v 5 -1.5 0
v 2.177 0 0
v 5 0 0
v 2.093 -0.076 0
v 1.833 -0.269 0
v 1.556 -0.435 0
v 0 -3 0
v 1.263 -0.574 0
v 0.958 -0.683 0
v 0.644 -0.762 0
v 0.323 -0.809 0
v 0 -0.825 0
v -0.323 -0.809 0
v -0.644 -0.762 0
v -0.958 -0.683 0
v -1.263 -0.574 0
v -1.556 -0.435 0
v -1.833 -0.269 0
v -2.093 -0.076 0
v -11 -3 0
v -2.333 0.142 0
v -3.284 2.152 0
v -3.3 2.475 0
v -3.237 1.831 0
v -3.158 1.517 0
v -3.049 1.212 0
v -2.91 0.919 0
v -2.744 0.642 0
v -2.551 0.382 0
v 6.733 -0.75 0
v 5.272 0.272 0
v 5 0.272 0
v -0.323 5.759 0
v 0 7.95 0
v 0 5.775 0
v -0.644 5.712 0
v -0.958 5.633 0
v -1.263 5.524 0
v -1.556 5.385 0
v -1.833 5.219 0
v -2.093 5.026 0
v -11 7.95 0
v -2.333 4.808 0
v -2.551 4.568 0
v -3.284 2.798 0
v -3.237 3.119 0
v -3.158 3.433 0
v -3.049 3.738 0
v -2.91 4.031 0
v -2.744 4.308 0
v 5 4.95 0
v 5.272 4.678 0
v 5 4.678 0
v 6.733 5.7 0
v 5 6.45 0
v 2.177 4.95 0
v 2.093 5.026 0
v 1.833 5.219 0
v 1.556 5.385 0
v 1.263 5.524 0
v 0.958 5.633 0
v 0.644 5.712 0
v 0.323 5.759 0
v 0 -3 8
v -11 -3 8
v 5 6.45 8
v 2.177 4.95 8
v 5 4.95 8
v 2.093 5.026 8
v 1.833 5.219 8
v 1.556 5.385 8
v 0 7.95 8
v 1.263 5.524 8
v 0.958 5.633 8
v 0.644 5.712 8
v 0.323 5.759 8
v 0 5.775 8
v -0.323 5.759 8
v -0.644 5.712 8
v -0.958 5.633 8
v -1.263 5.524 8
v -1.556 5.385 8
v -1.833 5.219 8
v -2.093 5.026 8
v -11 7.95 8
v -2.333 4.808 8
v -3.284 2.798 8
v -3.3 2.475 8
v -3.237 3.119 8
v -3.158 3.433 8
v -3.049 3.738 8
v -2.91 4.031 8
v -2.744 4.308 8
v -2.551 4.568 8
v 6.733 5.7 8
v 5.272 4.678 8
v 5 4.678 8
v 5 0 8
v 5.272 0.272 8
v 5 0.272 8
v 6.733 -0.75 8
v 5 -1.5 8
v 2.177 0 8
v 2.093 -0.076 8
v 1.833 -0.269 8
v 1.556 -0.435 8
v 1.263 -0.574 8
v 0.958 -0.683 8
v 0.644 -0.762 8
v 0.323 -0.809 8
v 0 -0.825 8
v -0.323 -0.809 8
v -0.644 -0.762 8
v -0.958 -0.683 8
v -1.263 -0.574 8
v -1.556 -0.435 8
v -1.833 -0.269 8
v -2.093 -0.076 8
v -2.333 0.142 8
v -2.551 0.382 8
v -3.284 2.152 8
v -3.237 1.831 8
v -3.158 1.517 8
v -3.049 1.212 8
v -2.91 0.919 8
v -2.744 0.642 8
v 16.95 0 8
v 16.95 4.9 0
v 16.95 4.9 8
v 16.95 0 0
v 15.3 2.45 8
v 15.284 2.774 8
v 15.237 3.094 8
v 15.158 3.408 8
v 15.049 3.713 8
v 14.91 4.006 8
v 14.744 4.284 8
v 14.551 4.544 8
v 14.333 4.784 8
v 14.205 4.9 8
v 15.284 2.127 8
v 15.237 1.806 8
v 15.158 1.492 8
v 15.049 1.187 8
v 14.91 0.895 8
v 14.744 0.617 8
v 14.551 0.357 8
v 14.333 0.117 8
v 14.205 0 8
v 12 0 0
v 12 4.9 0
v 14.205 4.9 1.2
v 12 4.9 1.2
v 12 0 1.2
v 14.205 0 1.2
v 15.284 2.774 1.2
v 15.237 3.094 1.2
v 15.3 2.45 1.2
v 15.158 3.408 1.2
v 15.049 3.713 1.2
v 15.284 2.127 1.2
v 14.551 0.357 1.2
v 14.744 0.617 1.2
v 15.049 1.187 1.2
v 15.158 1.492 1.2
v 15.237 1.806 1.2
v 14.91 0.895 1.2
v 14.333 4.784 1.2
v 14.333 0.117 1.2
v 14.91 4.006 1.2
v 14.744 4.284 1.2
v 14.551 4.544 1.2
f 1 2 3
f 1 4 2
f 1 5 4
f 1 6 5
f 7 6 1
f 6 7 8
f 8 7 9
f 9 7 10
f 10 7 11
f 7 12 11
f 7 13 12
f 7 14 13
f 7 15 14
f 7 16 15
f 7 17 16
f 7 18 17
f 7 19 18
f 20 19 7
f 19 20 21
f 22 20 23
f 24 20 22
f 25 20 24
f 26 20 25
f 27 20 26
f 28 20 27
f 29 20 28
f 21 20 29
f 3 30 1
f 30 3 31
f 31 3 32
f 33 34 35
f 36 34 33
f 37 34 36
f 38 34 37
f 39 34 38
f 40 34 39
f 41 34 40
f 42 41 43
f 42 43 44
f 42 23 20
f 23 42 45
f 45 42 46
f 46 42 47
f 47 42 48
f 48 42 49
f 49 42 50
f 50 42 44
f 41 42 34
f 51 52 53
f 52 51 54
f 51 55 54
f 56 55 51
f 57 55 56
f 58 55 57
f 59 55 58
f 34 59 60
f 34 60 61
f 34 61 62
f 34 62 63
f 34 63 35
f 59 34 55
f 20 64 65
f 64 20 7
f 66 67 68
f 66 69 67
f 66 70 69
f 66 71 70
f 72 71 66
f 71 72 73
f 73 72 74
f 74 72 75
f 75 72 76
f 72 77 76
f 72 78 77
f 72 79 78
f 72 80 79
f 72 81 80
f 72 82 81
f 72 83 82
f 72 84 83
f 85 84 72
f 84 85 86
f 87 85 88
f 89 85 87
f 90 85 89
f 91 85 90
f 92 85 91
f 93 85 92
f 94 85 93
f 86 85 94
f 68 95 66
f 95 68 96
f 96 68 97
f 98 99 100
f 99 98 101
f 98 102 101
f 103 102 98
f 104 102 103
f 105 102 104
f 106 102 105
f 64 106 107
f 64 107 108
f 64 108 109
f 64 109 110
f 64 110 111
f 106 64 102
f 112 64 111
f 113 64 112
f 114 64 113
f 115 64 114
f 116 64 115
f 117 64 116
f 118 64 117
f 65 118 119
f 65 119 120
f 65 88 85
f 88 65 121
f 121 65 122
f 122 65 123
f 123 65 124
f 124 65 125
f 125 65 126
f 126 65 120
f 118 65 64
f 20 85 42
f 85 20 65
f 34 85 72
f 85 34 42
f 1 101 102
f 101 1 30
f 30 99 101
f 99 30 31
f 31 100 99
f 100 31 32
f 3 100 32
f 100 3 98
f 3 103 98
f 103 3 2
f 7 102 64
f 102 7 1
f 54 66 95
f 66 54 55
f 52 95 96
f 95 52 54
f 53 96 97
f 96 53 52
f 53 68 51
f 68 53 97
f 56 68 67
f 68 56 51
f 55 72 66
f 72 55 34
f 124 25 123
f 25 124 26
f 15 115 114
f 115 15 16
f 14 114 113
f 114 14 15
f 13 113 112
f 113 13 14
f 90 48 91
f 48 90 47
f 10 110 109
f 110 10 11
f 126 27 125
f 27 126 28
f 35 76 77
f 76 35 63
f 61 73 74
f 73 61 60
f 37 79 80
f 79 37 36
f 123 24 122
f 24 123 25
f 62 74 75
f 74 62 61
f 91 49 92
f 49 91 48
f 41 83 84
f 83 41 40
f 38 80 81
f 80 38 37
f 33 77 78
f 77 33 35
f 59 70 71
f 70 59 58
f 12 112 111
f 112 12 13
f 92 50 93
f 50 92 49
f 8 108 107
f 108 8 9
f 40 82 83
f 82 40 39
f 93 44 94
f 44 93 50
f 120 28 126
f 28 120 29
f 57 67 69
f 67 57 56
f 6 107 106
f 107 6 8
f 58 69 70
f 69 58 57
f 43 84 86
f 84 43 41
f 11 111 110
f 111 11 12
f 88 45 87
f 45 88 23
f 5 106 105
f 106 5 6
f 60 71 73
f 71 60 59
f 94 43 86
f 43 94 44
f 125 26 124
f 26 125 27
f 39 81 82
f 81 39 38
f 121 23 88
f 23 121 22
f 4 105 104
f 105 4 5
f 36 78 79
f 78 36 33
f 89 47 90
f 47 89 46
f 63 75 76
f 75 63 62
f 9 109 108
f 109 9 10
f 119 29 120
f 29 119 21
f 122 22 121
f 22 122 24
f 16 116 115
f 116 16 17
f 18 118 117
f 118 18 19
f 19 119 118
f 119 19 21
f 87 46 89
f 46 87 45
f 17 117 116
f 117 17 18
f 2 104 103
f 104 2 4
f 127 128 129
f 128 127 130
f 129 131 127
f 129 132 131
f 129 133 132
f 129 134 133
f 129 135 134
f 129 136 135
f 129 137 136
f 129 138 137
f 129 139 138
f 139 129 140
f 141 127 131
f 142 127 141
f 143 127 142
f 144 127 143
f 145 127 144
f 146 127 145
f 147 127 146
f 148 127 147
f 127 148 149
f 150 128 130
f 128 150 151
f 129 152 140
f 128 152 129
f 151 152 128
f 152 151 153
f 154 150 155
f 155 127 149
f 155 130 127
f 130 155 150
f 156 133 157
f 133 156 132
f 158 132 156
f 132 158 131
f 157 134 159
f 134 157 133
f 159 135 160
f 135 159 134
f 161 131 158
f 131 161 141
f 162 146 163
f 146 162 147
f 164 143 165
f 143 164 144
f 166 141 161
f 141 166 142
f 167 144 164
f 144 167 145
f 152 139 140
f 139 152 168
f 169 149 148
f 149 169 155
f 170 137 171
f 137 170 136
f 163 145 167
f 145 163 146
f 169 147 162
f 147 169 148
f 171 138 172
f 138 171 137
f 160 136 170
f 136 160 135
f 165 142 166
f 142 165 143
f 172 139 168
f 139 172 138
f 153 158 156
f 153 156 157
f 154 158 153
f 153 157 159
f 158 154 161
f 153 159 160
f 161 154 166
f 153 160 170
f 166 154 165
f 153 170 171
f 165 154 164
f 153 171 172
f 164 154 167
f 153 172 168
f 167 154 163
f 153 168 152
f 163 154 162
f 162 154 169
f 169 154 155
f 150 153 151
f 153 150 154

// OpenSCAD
// file: ../docs/snapfit-know-hows/simple-snapfit-joints-lib/files/SnapLib.0.36.scad
/*simple Snap library based on "Snap-Fit Joints for Plastics - A Design Guid" by Bayer MaterialScience LLC 
  http://fab.cba.mit.edu/classes/S62.12/people/vernelle.noel/Plastic_Snap_fit_design.pdf
 
 on http://www.thingiverse.com/thing:1860118
 
    by fpetrac Fausto Petraccone fpetrac@gmail.com 
    Licensed under the Creative Commons - Attribution - Non-Commercial license.
*/

/*Rev
    SnapLib 0.36.scad: added SnapHoleY function  
    SnapLib 0.35.scad: on RSnapY added a check to avioid interference of lobes during closure; on RRSnappY added a check to avioid overlapped lobes.
    SnapLib 0.30.scad  added function Hsnap and Snap to calculate the snap H or Y for cantilever snap
    SnapLib 0.25.scad  added Scale factor f to reduce the calculate value h or y (this mantain the snap on unbreakable zone when f>1)
    SnapLib 0.20.scad  Bug Fix
    SnapLib 0.10.scad  added RSnapY RRSnapY
    SnapLib 0.00.scad  first release
*/


/*
eps=0.5*6/100;//Elongation at break of PLA=6%
eps=0.5*12/100;//Elongation at break of ABS=12%
eps=0.5*18/100;//Elongation at break of PETG=18%
*/

eps=0.5*6/100;//Elongation at break of PLA=6%


function Hsnap(l,y,f)= (1.09/f)*(eps*pow(l,2))/(y);
function Ysnap(l,h,f)= (1.09/f)*(eps*pow(l,2))/(h);

//SnapH(l,y,a,b,f=1) Define y calculate h and divide the calculte h value to a factor f
module SnapH(l,y,a,b,f=1)   
{
    h=Hsnap(l,y,f);
    p=y;
    echo("h is",h);
linear_extrude(height = b, center = f, convexity = 10, twist = 0)
polygon([[0,0],[l,0],[l,y],[l+p,y],[l+p+(y+h/4)/tan(a),-h/4],[l,-h/2],[0,-h]]);
}
//SnapY(l,h,a,b,f=1) Define h calculate y and divide the calculte y value to a factor f
module SnapY(l,h,a,b,f=1)
{
    y=Ysnap(l,h,f);
    p=y;
    echo("y is", y);
linear_extrude(height = b, center = f, convexity = 10, twist = 0)
polygon([[0,0],[l,0],[l,y],[l+p,y],[l+p+(y+h/4)/tan(a),-h/4],[l,-h/2],[0,-h]]);
}
//SnapHoleY(l,h,a,b,f=1,Pr=2) Define h calculate y and divide the calculte y value to a factor f the total hole depth is h*PR
module SnapHoleY(l,h,a,b,f=1,Pr=2){
        //%SnapY(l,h,a,b);  
        y=Ysnap(l,h,f);
        YY=Pr*h;//depth Y;
        XX=1.1*(y+(y+h/4)/tan(a)); //Altezza totale +10%
        ZZ=0+b; //largezza piu tolleranza
        union(){
            translate([0,-YY,(b-ZZ)/2])cube([l,YY,ZZ],center=false); //gambo
            translate([l,-YY,(b-ZZ)/2])cube([XX,YY+y,ZZ],center=false);//testa
        }    
 }



//Define h calculate y and divide the calculated value to f
module RSnapY(l,h,a,Lobi,r2,f=1,K2=2)   
{
    Theta=180/Lobi;
    y=(1.64/f)*K2*(eps*pow(l,2))/(r2);
    p=y;
    echo("y is", y);
    echo("r1/r2",(r2-h)/r2);
    echo("Theta", Theta);
    echo("r2-h",(r2-h));
    if(((r2-h)>y)&&(h<r2)){ //(r2-h)>y should be (r2-h/2)>y and  h<r2 for scad problem
      for(f=[0:1:Lobi])
          rotate([0,0,Theta*2*f])
              rotate_extrude(angle = Theta, convexity = 2,$fn=200)
                  translate([r2,0,0])
                      mirror([1,-1,0])
                          polygon([[0,0],[l,0],[l,y],[l+p,y],[l+p+(y+h/4)/tan(a),-h/4],[l,-h/2],[0,-h]]);
    }
    else{
      echo ("<b>WARNING:</b>");
      echo("y should be < r2-h ");
      echo("h should be < r2 ");
    }
}
//Define h calculate y and divide the calculated value to f
module RRSnapY(l,h,a,Lobi,r2,f=1,K1=2)
{
    Theta=180/Lobi;
    y=(1.64/f)*K1*(eps*pow(l,2))/(r2);
    p=y;
    echo("y is", y);
    echo("r1/r2",(r2-h)/r2);
    echo("Theta", Theta);
    echo("r2-y",(r2-y));
    if(y<r2){
      for(f=[0:1:Lobi])
          rotate([0,180,Theta*2*f])
              rotate_extrude(angle = Theta, convexity = 2,$fn=200)
                  translate([r2,0,0])
                      mirror([1,1,0])
                          polygon([[0,0],[l,0],[l,y],[l+p,y],[l+p+(y+h/4)/tan(a),-h/4],[l,-h/2],[0,-h]]);
  }
      else{
      echo ("<b>WARNING:</b>");
      echo("y should be < r2 ");
      }
}
// main file
/*
Experiment 004: cantilever clip based on Simple Snap-Fit Joints Library 0.36.

Original library and example by Fausto Petraccone (fpetrac):
https://www.thingiverse.com/thing:1860118
Licensed CC Attribution-NonCommercial.
*/

include <../docs/snapfit-know-hows/simple-snapfit-joints-lib/files/SnapLib.0.36.scad>

$fn = 64;

part_id = 0; // 0 = print layout, 1 = clip, 2 = insert, 3 = assembly preview

insert_radius = 3.3;
insert_height = insert_radius * 1.5;
arm_length = 5;
hook_height = 3;
part_width = 8;
fit_scale = 0.99;
insert_web = 1.2;

module library_clip() {
    difference() {
        union() {
            linear_extrude(height = part_width)
                polygon([
                    [0, -hook_height],
                    [-11, -hook_height],
                    [-11, insert_height + hook_height],
                    [0, insert_height + hook_height]
                ]);

            SnapY(l = arm_length, h = hook_height, a = 35, b = part_width);

            translate([0, insert_height, 0])
                mirror([0, 1, 0])
                    SnapY(l = arm_length, h = hook_height, a = 35, b = part_width);
        }

        translate([0, insert_height / 2, -0.1])
            cylinder(h = part_width + 0.2, r = insert_radius);
    }
}

module matching_insert() {
    scaled_height = fit_scale * insert_height;
    scaled_length = fit_scale * arm_length;

    union() {
        difference() {
            cube([scaled_length, scaled_height, part_width]);
            translate([0, scaled_height / 2, -0.1])
                cylinder(h = part_width + 0.2, r = insert_radius);
        }

        // The author's visual test gauge is split into two crescents. This web
        // joins them inside the clip's empty cable cavity without changing the
        // exterior surface that contacts the snap arms.
        cube([scaled_length, scaled_height, insert_web]);
    }
}

module print_layout() {
    library_clip();
    translate([12, 0, 0]) matching_insert();
}

module assembly_preview() {
    color("gold") library_clip();
    color("deepskyblue", 0.75)
        matching_insert();
}

if (part_id == 1) {
    library_clip();
} else if (part_id == 2) {
    matching_insert();
} else if (part_id == 3) {
    assembly_preview();
} else {
    print_layout();
}
